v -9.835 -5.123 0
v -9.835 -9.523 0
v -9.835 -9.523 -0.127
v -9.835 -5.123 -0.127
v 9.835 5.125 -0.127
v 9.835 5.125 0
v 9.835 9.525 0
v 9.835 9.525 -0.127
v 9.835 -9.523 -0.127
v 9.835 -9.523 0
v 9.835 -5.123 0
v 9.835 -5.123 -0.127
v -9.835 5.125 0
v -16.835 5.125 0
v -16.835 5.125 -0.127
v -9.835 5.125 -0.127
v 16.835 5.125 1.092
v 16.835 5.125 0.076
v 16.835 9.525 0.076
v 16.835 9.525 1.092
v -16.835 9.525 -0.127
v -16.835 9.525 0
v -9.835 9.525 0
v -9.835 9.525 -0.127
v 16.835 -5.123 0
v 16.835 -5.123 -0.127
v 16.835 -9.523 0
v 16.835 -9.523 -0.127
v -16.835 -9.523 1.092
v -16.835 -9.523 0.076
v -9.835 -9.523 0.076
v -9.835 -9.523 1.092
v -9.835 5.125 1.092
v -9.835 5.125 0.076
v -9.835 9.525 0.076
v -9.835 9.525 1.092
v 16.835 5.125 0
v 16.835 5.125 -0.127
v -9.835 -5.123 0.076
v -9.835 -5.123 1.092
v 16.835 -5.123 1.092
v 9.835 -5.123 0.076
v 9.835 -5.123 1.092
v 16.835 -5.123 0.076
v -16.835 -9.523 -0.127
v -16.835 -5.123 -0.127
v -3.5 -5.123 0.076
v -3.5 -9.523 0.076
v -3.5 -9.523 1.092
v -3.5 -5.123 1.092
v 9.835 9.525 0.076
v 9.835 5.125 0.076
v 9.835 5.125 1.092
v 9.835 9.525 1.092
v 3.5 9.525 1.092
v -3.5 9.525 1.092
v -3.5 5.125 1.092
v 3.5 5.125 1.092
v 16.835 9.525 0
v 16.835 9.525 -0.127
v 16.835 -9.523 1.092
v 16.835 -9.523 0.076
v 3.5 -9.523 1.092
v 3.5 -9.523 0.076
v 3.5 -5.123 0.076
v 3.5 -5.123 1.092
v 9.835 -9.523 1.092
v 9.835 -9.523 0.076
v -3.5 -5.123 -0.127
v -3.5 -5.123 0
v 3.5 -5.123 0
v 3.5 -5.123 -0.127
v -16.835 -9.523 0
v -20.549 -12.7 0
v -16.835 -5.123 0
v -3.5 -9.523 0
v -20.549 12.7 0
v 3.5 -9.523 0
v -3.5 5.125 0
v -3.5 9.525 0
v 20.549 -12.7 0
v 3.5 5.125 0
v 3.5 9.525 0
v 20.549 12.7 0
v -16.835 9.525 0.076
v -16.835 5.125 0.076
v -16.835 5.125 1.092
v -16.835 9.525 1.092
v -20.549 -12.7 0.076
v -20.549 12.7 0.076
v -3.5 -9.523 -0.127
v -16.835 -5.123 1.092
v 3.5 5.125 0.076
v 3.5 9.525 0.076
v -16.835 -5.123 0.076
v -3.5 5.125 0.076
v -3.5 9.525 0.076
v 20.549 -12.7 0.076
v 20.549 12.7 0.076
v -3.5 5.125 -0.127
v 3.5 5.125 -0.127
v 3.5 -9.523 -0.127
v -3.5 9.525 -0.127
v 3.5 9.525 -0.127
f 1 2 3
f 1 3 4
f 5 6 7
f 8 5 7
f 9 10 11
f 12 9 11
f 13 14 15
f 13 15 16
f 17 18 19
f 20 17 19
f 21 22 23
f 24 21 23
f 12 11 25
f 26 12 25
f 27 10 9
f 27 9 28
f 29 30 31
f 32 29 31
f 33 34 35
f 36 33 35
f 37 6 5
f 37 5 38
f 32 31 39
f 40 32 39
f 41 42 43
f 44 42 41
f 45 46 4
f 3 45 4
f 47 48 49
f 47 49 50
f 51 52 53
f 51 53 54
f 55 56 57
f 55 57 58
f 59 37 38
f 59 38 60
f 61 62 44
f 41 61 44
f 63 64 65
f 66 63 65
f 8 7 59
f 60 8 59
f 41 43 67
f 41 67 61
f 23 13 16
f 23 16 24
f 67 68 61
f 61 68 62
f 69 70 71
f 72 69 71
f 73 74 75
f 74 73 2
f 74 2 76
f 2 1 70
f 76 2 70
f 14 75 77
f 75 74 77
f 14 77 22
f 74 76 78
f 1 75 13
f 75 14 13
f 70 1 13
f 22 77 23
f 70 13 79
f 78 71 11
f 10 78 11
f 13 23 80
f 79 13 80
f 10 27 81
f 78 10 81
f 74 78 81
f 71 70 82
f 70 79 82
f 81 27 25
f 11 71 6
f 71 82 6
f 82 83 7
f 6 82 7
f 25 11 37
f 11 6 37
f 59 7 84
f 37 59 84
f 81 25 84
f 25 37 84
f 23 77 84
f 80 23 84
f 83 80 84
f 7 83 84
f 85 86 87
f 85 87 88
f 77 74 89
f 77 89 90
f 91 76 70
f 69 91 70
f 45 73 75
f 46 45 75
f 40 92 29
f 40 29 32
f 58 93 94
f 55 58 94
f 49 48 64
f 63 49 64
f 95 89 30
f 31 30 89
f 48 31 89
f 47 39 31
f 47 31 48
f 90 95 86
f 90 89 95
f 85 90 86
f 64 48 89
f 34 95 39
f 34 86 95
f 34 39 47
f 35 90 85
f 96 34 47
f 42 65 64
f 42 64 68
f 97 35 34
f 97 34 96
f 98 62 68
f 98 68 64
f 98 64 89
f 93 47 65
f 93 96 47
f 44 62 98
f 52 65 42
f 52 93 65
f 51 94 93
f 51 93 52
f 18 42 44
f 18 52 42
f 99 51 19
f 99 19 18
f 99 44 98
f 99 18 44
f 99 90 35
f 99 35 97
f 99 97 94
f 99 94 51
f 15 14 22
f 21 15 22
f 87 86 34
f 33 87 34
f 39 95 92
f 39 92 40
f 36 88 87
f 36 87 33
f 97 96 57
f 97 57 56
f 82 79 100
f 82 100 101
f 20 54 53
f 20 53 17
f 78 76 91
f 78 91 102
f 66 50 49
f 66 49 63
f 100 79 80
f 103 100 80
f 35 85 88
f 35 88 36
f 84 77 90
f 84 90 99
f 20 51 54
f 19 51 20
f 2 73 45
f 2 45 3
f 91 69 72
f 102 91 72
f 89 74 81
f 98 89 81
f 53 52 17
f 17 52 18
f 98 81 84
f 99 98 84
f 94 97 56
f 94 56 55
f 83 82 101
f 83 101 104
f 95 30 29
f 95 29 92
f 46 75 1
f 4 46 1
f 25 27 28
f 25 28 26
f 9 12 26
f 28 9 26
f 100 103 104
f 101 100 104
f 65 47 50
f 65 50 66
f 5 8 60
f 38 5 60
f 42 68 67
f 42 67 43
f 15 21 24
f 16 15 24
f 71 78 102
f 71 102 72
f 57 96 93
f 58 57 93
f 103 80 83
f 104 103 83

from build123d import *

# Parameters (mm, degrees)
F0_W     = 41.0972
F0_H     = 25.4
F1_DEPTH = 0.0762
F2_W     = 7
F2_H     = 4.4
F3_DEPTH = 1.016
F4_DEPTH = 0.2032


with BuildPart() as f1:
    # F0 (on Top) → F1 (new body)
    with BuildSketch(Plane.XY):
        Rectangle(F0_W, F0_H)
    extrude(amount=F1_DEPTH)

    # F2 (on face) → F3 (join)
    with BuildSketch(Plane.XY.offset(0.0762)):
        with Locations((-13.33512, 7.325)):
            Rectangle(F2_W, F2_H)
        with Locations((-13.33512, -7.32318)):
            Rectangle(F2_W, F2_H)
        with Locations((-0.00012, 7.325)):
            Rectangle(F2_W, F2_H)
        with Locations((-0.00012, -7.32318)):
            Rectangle(F2_W, F2_H)
        with Locations((13.33488, 7.325)):
            Rectangle(F2_W, F2_H)
        with Locations((13.33488, -7.32318)):
            Rectangle(F2_W, F2_H)
    extrude(amount=F3_DEPTH)

    # F2 (on face) → F4 (join)
    with BuildSketch(Plane.XY.offset(0.0762)):
        with Locations((-13.33512, 7.325)):
            Rectangle(F2_W, F2_H)
        with Locations((-13.33512, -7.32318)):
            Rectangle(F2_W, F2_H)
        with Locations((-0.00012, 7.325)):
            Rectangle(F2_W, F2_H)
        with Locations((-0.00012, -7.32318)):
            Rectangle(F2_W, F2_H)
        with Locations((13.33488, 7.325)):
            Rectangle(F2_W, F2_H)
        with Locations((13.33488, -7.32318)):
            Rectangle(F2_W, F2_H)
    extrude(amount=-F4_DEPTH)


solid = f1.part
